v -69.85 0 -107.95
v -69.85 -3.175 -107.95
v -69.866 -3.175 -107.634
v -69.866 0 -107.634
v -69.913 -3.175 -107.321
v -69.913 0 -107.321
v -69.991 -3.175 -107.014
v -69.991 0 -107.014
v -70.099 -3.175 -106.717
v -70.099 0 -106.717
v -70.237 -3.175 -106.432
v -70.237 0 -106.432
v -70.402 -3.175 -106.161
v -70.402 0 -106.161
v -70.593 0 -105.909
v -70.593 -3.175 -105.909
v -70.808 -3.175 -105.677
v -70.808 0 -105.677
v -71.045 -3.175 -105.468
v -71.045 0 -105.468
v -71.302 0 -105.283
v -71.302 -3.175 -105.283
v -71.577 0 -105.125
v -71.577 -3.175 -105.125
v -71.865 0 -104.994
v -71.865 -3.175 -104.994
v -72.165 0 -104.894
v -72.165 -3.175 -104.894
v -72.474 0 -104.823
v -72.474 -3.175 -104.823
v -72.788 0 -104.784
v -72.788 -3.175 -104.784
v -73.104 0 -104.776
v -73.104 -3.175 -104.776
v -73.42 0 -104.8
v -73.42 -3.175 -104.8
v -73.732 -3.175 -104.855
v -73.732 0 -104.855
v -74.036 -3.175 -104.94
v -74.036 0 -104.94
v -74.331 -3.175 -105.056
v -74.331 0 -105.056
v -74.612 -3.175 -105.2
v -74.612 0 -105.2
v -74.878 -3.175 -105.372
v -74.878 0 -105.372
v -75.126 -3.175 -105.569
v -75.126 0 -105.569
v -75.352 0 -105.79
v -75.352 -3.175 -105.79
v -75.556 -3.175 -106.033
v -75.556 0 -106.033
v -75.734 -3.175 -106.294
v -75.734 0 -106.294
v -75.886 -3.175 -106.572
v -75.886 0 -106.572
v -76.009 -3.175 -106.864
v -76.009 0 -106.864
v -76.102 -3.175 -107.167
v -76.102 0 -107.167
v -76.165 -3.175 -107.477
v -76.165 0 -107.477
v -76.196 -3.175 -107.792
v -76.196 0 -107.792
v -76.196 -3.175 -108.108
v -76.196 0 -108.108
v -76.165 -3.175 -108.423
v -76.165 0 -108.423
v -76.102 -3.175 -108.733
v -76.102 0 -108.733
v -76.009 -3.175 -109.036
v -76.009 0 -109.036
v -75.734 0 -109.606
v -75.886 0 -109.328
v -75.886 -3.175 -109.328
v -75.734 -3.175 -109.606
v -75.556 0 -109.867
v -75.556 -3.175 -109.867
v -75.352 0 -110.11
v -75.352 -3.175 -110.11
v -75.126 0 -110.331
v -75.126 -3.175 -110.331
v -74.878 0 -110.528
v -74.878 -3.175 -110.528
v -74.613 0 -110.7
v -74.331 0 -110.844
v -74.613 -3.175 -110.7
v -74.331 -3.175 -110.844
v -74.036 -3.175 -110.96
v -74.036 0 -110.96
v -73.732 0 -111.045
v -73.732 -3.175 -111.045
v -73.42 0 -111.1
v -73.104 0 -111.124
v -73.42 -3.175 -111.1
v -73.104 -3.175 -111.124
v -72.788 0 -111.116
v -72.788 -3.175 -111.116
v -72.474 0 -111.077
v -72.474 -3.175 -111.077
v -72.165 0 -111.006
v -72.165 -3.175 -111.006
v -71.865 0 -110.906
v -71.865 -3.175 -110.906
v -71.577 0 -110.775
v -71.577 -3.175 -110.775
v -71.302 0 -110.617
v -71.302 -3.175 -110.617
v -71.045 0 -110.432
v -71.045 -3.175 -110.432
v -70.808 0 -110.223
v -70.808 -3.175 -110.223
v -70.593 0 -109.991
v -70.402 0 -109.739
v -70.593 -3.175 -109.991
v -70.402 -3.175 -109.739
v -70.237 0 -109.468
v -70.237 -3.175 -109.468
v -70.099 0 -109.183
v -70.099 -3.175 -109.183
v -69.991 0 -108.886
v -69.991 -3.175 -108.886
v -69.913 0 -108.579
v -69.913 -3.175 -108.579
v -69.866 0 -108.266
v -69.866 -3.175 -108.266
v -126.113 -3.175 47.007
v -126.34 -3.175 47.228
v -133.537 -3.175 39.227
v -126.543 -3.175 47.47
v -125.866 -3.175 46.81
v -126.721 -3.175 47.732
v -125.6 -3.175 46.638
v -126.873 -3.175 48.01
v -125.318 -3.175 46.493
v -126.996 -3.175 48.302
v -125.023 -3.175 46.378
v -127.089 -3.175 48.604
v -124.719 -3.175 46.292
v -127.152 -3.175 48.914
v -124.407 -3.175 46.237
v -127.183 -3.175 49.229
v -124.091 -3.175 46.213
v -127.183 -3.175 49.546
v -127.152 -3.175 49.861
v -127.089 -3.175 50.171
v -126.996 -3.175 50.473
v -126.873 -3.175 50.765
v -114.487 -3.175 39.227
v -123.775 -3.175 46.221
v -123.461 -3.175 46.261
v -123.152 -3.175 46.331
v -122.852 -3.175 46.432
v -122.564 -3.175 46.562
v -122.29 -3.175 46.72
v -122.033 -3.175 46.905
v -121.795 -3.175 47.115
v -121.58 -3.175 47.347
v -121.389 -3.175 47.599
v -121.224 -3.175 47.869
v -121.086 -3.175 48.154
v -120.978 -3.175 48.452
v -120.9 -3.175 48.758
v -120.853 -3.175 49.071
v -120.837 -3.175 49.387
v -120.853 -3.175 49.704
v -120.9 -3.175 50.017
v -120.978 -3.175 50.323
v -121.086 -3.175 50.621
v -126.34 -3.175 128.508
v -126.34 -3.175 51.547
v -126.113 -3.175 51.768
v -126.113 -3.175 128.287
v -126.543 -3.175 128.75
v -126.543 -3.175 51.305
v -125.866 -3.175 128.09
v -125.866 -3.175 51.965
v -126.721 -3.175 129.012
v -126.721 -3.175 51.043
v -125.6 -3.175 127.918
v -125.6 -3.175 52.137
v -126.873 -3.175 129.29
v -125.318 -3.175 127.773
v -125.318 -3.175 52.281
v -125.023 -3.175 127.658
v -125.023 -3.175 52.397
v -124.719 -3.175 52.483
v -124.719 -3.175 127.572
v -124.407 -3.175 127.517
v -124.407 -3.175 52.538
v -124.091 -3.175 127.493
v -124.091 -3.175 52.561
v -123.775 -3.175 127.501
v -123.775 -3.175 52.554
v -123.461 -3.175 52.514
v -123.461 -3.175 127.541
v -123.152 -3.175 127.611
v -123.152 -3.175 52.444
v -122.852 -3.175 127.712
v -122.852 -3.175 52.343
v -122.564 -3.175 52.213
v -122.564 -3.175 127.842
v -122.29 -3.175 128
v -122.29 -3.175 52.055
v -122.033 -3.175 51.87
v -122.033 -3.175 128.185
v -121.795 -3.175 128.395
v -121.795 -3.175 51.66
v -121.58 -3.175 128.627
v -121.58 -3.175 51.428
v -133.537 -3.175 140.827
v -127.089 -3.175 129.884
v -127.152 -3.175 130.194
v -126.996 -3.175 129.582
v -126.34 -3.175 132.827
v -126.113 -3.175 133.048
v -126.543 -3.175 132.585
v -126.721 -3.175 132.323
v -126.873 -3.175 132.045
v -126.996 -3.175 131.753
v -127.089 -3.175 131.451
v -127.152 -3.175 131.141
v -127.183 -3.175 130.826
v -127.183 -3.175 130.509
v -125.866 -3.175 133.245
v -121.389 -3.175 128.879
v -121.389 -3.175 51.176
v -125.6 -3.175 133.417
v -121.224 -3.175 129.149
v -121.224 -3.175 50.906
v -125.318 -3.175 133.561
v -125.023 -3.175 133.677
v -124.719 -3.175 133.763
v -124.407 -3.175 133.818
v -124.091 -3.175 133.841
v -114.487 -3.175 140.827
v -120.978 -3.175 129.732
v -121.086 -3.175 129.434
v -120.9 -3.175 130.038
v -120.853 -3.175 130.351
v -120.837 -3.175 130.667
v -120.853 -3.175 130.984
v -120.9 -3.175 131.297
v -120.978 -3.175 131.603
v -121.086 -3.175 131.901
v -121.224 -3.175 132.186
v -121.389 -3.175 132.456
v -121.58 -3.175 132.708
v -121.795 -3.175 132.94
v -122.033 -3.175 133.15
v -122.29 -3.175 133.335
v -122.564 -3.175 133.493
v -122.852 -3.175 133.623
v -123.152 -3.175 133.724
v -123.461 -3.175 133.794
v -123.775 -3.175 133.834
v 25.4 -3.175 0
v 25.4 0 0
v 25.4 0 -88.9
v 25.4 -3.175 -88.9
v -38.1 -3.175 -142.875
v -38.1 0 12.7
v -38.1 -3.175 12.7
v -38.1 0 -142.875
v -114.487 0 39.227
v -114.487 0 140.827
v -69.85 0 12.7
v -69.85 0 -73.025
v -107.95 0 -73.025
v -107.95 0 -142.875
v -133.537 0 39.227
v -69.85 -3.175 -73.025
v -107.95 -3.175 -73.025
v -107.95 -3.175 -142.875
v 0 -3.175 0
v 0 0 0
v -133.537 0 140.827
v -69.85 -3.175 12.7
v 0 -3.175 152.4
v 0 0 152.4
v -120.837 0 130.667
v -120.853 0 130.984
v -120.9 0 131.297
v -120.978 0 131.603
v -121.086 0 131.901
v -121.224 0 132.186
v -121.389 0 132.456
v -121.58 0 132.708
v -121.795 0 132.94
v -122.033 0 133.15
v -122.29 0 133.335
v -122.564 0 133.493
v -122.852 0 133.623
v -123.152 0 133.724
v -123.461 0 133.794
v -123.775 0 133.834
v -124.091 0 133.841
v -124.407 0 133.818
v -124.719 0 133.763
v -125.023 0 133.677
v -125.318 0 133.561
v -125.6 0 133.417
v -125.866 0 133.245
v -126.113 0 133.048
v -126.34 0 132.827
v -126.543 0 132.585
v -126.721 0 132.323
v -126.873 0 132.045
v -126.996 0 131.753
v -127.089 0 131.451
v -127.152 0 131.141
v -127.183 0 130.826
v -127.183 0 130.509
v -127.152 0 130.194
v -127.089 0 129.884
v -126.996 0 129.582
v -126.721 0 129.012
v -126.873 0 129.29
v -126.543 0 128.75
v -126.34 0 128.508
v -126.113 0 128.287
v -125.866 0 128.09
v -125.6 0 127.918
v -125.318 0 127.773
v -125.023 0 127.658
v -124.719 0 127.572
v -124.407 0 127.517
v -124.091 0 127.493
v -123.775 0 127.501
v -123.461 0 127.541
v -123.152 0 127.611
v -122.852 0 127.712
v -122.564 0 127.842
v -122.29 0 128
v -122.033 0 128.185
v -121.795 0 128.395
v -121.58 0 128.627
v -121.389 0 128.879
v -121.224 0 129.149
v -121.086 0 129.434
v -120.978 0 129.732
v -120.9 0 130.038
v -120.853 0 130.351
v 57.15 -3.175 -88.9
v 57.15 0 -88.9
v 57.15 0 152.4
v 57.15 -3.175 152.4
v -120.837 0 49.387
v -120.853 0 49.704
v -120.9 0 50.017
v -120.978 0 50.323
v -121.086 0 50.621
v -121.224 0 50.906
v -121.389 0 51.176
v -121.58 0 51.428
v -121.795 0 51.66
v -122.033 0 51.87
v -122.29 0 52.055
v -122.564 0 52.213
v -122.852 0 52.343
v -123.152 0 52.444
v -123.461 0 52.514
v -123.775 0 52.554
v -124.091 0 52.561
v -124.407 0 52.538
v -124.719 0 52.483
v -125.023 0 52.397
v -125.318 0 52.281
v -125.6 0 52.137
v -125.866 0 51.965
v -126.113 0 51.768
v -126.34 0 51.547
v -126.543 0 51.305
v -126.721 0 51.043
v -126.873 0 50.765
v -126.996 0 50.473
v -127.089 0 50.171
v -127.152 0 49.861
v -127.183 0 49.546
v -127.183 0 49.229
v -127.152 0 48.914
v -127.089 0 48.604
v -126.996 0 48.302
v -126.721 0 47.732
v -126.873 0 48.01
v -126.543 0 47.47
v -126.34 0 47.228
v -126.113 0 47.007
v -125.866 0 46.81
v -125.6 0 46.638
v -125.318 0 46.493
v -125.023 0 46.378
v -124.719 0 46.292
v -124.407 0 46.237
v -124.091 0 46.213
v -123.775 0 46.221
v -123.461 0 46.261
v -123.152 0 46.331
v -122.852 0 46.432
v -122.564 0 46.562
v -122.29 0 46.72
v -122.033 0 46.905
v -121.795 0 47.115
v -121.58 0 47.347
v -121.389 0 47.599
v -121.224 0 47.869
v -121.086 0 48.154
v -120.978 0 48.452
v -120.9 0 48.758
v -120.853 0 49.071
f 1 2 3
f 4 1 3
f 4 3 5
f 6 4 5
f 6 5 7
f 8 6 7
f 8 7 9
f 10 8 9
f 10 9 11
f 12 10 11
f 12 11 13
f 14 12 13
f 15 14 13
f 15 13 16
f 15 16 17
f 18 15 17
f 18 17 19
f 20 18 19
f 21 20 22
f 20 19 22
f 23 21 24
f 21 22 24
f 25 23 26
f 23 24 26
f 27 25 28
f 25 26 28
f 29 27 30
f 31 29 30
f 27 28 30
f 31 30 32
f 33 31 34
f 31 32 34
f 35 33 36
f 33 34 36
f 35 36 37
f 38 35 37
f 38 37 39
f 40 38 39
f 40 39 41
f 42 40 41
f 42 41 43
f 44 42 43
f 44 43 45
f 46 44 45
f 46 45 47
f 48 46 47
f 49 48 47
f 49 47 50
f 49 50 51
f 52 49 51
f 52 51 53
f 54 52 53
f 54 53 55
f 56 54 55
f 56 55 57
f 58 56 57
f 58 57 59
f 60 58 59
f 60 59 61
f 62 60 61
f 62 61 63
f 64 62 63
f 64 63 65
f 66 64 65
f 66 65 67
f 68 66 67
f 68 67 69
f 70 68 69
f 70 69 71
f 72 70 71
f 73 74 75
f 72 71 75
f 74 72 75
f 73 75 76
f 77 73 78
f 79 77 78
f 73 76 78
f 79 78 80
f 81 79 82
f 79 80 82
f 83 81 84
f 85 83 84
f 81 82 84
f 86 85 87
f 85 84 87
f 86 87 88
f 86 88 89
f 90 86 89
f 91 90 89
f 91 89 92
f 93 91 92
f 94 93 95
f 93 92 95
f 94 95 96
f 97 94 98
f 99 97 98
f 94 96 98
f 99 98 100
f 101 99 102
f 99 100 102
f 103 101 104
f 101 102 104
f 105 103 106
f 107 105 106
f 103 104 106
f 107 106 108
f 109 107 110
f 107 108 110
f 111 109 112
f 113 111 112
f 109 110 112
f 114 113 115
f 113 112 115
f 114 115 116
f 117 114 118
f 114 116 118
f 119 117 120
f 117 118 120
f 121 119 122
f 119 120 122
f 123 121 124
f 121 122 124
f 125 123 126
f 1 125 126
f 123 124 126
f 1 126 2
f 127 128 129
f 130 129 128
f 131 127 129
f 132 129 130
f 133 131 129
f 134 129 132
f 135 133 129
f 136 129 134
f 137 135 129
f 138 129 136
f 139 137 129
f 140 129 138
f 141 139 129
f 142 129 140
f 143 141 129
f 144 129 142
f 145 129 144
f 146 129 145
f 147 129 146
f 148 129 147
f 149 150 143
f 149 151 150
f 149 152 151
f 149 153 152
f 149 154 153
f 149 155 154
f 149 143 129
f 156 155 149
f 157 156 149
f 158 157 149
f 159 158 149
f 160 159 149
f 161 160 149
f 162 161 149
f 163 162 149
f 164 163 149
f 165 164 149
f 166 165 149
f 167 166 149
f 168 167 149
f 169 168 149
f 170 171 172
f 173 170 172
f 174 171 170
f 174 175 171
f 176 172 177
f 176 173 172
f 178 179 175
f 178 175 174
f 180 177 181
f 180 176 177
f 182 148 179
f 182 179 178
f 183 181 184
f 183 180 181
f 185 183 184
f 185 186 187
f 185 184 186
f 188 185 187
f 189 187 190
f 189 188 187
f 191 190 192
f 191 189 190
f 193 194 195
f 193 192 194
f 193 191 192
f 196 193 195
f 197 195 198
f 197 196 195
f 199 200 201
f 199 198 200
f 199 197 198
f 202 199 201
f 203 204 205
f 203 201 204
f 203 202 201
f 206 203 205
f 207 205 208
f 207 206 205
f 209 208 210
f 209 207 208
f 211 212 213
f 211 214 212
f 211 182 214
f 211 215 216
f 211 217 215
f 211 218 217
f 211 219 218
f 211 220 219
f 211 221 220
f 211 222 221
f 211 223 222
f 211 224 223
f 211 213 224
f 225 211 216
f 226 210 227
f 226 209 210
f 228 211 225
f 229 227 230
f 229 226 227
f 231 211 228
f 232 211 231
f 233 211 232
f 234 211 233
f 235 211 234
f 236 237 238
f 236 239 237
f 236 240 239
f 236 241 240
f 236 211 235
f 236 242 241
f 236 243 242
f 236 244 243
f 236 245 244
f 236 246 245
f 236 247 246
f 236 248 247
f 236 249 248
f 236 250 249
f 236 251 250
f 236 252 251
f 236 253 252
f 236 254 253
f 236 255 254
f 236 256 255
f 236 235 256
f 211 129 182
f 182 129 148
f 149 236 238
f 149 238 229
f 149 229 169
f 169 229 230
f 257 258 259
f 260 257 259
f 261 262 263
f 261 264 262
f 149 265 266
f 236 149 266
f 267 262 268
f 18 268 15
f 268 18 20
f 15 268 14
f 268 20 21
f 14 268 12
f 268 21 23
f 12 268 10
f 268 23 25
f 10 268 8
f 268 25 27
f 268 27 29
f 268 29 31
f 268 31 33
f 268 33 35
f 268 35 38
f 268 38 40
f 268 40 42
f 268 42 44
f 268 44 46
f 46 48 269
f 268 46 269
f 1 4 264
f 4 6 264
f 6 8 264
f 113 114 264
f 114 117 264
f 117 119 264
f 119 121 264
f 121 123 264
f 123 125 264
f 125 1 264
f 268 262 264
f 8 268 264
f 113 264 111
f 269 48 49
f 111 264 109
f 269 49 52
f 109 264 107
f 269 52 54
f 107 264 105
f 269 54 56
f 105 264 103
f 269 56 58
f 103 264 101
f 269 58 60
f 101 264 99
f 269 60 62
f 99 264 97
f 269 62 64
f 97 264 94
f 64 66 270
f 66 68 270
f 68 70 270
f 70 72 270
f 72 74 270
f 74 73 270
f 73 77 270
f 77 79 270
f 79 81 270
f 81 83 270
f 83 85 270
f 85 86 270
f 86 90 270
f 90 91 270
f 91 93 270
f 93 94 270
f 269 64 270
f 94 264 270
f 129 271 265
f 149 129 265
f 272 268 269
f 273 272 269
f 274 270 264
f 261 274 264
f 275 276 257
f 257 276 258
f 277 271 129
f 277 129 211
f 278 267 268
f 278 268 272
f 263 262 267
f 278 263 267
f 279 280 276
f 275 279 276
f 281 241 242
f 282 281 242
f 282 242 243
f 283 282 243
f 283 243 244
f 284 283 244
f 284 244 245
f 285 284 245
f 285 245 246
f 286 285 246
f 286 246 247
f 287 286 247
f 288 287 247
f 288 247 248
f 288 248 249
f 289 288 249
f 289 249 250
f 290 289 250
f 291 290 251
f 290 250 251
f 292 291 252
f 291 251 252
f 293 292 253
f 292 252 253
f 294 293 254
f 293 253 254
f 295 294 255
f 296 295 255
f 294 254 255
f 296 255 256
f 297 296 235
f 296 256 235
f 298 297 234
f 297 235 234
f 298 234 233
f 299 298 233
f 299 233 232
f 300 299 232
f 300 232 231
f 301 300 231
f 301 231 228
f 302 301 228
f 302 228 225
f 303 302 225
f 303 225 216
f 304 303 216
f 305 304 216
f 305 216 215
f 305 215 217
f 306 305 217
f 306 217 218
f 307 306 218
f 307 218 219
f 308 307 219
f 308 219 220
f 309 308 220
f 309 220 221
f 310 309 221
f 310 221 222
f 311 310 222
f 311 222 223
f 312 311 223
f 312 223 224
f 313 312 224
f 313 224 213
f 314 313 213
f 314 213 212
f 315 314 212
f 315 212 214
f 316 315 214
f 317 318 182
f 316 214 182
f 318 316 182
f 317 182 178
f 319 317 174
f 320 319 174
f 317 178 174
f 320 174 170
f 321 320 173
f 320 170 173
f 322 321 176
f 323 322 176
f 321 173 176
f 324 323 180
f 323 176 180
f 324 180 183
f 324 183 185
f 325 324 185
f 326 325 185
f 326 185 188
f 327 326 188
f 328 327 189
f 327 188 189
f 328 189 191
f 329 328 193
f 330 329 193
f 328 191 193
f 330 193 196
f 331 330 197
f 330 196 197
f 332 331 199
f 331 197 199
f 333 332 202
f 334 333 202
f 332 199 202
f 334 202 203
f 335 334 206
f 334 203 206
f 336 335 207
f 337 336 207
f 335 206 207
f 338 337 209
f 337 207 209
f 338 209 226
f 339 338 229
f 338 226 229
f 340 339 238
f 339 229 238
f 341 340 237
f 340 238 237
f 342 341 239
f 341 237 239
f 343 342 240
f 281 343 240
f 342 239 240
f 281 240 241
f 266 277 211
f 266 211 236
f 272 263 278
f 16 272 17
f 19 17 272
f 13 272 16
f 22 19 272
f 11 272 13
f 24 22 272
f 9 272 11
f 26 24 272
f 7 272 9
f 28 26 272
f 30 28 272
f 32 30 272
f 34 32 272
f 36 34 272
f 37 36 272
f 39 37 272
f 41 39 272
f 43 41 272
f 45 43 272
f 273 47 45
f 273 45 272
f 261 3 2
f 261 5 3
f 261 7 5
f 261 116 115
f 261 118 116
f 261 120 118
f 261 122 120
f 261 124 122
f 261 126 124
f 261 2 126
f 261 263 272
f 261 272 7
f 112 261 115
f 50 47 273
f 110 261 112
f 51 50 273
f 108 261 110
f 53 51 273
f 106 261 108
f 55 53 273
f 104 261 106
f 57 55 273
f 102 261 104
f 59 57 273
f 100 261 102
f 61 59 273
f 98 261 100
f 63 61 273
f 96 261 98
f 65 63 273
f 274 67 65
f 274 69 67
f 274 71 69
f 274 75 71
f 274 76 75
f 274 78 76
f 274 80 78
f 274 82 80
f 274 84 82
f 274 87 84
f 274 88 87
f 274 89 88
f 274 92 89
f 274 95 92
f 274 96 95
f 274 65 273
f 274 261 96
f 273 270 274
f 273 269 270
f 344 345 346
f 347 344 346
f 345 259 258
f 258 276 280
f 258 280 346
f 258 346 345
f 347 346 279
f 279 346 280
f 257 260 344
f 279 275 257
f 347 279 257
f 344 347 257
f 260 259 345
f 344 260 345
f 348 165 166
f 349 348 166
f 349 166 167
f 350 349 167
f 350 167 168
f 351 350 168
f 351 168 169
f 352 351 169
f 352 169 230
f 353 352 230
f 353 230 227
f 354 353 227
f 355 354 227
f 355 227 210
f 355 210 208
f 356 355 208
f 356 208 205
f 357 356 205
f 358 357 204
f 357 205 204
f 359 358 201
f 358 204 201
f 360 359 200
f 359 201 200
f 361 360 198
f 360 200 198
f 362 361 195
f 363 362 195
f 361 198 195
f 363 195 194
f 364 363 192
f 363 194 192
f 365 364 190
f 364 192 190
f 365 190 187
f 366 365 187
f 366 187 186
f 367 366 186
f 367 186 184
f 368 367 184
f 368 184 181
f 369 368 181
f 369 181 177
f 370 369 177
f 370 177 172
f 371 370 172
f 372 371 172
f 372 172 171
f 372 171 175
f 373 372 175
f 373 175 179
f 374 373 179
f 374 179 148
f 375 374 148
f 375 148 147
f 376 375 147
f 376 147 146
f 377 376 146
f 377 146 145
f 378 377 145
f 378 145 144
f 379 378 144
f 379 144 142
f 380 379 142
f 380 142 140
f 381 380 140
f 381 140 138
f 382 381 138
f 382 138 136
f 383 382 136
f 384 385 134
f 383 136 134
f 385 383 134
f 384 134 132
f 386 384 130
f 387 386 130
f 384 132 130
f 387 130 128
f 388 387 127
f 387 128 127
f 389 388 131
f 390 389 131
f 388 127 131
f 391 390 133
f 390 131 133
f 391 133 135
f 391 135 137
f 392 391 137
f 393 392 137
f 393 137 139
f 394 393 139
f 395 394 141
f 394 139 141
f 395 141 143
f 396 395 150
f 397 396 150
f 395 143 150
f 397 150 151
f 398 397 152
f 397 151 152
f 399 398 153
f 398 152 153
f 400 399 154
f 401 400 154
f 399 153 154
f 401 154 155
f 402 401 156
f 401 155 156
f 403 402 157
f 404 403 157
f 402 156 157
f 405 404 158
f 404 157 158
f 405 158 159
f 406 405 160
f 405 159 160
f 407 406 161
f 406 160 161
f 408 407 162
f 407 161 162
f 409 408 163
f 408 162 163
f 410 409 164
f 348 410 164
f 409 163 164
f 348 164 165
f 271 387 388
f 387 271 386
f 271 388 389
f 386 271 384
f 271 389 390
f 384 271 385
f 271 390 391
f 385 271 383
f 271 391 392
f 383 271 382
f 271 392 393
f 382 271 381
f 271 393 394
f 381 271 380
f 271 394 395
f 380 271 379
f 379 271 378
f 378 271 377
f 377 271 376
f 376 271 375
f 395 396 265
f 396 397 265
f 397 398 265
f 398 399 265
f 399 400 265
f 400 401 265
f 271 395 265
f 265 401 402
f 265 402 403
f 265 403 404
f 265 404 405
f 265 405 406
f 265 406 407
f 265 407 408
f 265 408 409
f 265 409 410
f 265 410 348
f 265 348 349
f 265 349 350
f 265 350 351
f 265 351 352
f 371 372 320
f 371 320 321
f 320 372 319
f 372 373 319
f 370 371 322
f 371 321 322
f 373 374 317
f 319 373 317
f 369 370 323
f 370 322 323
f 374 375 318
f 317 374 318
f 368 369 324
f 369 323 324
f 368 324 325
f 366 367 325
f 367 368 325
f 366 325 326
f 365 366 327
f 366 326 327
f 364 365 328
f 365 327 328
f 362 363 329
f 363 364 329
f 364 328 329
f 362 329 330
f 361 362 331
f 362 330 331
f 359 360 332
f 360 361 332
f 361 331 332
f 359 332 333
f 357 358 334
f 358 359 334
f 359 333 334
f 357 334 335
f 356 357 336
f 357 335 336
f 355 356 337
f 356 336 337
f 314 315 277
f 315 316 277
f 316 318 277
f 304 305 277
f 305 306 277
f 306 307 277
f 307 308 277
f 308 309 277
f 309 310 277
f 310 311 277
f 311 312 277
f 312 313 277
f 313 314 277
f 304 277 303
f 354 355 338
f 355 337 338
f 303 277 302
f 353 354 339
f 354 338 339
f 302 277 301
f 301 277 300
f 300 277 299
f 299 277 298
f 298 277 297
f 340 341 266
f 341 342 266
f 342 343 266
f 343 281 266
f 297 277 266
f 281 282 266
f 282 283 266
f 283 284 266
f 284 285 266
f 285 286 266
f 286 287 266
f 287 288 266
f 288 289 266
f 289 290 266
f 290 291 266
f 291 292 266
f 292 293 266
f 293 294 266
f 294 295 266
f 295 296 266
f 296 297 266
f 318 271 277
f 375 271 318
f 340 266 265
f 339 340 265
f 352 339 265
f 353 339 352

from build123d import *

# Parameters (mm, degrees)
F1_DEPTH  = 3.175
F3_DEPTH  = 3.175
F4_DEPTH  = 31.75
F5_DEPTH  = 12.7
F6_R      = 3.175
F7_DEPTH  = 25.4
F8_W      = 19.05
F8_H      = 101.6
F9_DEPTH  = 3.175
F10_R     = 3.175
F11_DEPTH = 25.4


with BuildPart() as f1:
    # F0 (on Front) → F1 (new body)
    with BuildSketch(Plane.XZ):
        Polygon((57.15, 152.4), (0, 152.4), (0, 0), (25.4, 0), (25.4, -88.9), (57.15, -88.9), (57.15, 0), align=None)
    extrude(amount=F1_DEPTH)


with BuildPart() as f3:
    # F2 (on Front) → F3 (new body)
    with BuildSketch(Plane.XZ):
        Polygon((-38.1, 0), (-69.85, 0), (-69.85, -73.025), (-107.95, -73.025), (-107.95, -111.125), (-69.85, -111.125), (-38.1, -111.125), (-38.1, -73.025), align=None)
    extrude(amount=F3_DEPTH)

    # F4 (add): a face of the model
    f4_faces = [f3.faces().sort_by_distance(p)[0] for p in [
        (-73.025, -1.5875, -111.125),
    ]]
    extrude(f4_faces, amount=F4_DEPTH)

    # F5 (add): a face of the model
    f5_faces = [f3.faces().sort_by_distance(p)[0] for p in [
        (-53.975, -1.5875, 0),
    ]]
    extrude(f5_faces, amount=F5_DEPTH)

    # F6 (on face) → F7 (cut)
    with BuildSketch(Plane.XZ.offset(3.175)):
        with Locations((-73.025, -107.95)):
            Circle(F6_R)
    extrude(amount=-F7_DEPTH, mode=Mode.SUBTRACT)


with BuildPart() as f9:
    # F8 (on Front) → F9 (new body)
    with BuildSketch(Plane.XZ):
        with Locations((-124.0121312439, 90.0274350342)):
            Rectangle(F8_W, F8_H)
    extrude(amount=F9_DEPTH)

    # F10 (on face) → F11 (cut)
    with BuildSketch(Plane.XZ.offset(3.175)):
        with Locations((-124.0121312439, 130.6674350342)):
            Circle(F10_R)
        with Locations((-124.0121312439, 49.3874350342)):
            Circle(F10_R)
    extrude(amount=-F11_DEPTH, mode=Mode.SUBTRACT)


solid = Compound([f1.part, f3.part, f9.part])
